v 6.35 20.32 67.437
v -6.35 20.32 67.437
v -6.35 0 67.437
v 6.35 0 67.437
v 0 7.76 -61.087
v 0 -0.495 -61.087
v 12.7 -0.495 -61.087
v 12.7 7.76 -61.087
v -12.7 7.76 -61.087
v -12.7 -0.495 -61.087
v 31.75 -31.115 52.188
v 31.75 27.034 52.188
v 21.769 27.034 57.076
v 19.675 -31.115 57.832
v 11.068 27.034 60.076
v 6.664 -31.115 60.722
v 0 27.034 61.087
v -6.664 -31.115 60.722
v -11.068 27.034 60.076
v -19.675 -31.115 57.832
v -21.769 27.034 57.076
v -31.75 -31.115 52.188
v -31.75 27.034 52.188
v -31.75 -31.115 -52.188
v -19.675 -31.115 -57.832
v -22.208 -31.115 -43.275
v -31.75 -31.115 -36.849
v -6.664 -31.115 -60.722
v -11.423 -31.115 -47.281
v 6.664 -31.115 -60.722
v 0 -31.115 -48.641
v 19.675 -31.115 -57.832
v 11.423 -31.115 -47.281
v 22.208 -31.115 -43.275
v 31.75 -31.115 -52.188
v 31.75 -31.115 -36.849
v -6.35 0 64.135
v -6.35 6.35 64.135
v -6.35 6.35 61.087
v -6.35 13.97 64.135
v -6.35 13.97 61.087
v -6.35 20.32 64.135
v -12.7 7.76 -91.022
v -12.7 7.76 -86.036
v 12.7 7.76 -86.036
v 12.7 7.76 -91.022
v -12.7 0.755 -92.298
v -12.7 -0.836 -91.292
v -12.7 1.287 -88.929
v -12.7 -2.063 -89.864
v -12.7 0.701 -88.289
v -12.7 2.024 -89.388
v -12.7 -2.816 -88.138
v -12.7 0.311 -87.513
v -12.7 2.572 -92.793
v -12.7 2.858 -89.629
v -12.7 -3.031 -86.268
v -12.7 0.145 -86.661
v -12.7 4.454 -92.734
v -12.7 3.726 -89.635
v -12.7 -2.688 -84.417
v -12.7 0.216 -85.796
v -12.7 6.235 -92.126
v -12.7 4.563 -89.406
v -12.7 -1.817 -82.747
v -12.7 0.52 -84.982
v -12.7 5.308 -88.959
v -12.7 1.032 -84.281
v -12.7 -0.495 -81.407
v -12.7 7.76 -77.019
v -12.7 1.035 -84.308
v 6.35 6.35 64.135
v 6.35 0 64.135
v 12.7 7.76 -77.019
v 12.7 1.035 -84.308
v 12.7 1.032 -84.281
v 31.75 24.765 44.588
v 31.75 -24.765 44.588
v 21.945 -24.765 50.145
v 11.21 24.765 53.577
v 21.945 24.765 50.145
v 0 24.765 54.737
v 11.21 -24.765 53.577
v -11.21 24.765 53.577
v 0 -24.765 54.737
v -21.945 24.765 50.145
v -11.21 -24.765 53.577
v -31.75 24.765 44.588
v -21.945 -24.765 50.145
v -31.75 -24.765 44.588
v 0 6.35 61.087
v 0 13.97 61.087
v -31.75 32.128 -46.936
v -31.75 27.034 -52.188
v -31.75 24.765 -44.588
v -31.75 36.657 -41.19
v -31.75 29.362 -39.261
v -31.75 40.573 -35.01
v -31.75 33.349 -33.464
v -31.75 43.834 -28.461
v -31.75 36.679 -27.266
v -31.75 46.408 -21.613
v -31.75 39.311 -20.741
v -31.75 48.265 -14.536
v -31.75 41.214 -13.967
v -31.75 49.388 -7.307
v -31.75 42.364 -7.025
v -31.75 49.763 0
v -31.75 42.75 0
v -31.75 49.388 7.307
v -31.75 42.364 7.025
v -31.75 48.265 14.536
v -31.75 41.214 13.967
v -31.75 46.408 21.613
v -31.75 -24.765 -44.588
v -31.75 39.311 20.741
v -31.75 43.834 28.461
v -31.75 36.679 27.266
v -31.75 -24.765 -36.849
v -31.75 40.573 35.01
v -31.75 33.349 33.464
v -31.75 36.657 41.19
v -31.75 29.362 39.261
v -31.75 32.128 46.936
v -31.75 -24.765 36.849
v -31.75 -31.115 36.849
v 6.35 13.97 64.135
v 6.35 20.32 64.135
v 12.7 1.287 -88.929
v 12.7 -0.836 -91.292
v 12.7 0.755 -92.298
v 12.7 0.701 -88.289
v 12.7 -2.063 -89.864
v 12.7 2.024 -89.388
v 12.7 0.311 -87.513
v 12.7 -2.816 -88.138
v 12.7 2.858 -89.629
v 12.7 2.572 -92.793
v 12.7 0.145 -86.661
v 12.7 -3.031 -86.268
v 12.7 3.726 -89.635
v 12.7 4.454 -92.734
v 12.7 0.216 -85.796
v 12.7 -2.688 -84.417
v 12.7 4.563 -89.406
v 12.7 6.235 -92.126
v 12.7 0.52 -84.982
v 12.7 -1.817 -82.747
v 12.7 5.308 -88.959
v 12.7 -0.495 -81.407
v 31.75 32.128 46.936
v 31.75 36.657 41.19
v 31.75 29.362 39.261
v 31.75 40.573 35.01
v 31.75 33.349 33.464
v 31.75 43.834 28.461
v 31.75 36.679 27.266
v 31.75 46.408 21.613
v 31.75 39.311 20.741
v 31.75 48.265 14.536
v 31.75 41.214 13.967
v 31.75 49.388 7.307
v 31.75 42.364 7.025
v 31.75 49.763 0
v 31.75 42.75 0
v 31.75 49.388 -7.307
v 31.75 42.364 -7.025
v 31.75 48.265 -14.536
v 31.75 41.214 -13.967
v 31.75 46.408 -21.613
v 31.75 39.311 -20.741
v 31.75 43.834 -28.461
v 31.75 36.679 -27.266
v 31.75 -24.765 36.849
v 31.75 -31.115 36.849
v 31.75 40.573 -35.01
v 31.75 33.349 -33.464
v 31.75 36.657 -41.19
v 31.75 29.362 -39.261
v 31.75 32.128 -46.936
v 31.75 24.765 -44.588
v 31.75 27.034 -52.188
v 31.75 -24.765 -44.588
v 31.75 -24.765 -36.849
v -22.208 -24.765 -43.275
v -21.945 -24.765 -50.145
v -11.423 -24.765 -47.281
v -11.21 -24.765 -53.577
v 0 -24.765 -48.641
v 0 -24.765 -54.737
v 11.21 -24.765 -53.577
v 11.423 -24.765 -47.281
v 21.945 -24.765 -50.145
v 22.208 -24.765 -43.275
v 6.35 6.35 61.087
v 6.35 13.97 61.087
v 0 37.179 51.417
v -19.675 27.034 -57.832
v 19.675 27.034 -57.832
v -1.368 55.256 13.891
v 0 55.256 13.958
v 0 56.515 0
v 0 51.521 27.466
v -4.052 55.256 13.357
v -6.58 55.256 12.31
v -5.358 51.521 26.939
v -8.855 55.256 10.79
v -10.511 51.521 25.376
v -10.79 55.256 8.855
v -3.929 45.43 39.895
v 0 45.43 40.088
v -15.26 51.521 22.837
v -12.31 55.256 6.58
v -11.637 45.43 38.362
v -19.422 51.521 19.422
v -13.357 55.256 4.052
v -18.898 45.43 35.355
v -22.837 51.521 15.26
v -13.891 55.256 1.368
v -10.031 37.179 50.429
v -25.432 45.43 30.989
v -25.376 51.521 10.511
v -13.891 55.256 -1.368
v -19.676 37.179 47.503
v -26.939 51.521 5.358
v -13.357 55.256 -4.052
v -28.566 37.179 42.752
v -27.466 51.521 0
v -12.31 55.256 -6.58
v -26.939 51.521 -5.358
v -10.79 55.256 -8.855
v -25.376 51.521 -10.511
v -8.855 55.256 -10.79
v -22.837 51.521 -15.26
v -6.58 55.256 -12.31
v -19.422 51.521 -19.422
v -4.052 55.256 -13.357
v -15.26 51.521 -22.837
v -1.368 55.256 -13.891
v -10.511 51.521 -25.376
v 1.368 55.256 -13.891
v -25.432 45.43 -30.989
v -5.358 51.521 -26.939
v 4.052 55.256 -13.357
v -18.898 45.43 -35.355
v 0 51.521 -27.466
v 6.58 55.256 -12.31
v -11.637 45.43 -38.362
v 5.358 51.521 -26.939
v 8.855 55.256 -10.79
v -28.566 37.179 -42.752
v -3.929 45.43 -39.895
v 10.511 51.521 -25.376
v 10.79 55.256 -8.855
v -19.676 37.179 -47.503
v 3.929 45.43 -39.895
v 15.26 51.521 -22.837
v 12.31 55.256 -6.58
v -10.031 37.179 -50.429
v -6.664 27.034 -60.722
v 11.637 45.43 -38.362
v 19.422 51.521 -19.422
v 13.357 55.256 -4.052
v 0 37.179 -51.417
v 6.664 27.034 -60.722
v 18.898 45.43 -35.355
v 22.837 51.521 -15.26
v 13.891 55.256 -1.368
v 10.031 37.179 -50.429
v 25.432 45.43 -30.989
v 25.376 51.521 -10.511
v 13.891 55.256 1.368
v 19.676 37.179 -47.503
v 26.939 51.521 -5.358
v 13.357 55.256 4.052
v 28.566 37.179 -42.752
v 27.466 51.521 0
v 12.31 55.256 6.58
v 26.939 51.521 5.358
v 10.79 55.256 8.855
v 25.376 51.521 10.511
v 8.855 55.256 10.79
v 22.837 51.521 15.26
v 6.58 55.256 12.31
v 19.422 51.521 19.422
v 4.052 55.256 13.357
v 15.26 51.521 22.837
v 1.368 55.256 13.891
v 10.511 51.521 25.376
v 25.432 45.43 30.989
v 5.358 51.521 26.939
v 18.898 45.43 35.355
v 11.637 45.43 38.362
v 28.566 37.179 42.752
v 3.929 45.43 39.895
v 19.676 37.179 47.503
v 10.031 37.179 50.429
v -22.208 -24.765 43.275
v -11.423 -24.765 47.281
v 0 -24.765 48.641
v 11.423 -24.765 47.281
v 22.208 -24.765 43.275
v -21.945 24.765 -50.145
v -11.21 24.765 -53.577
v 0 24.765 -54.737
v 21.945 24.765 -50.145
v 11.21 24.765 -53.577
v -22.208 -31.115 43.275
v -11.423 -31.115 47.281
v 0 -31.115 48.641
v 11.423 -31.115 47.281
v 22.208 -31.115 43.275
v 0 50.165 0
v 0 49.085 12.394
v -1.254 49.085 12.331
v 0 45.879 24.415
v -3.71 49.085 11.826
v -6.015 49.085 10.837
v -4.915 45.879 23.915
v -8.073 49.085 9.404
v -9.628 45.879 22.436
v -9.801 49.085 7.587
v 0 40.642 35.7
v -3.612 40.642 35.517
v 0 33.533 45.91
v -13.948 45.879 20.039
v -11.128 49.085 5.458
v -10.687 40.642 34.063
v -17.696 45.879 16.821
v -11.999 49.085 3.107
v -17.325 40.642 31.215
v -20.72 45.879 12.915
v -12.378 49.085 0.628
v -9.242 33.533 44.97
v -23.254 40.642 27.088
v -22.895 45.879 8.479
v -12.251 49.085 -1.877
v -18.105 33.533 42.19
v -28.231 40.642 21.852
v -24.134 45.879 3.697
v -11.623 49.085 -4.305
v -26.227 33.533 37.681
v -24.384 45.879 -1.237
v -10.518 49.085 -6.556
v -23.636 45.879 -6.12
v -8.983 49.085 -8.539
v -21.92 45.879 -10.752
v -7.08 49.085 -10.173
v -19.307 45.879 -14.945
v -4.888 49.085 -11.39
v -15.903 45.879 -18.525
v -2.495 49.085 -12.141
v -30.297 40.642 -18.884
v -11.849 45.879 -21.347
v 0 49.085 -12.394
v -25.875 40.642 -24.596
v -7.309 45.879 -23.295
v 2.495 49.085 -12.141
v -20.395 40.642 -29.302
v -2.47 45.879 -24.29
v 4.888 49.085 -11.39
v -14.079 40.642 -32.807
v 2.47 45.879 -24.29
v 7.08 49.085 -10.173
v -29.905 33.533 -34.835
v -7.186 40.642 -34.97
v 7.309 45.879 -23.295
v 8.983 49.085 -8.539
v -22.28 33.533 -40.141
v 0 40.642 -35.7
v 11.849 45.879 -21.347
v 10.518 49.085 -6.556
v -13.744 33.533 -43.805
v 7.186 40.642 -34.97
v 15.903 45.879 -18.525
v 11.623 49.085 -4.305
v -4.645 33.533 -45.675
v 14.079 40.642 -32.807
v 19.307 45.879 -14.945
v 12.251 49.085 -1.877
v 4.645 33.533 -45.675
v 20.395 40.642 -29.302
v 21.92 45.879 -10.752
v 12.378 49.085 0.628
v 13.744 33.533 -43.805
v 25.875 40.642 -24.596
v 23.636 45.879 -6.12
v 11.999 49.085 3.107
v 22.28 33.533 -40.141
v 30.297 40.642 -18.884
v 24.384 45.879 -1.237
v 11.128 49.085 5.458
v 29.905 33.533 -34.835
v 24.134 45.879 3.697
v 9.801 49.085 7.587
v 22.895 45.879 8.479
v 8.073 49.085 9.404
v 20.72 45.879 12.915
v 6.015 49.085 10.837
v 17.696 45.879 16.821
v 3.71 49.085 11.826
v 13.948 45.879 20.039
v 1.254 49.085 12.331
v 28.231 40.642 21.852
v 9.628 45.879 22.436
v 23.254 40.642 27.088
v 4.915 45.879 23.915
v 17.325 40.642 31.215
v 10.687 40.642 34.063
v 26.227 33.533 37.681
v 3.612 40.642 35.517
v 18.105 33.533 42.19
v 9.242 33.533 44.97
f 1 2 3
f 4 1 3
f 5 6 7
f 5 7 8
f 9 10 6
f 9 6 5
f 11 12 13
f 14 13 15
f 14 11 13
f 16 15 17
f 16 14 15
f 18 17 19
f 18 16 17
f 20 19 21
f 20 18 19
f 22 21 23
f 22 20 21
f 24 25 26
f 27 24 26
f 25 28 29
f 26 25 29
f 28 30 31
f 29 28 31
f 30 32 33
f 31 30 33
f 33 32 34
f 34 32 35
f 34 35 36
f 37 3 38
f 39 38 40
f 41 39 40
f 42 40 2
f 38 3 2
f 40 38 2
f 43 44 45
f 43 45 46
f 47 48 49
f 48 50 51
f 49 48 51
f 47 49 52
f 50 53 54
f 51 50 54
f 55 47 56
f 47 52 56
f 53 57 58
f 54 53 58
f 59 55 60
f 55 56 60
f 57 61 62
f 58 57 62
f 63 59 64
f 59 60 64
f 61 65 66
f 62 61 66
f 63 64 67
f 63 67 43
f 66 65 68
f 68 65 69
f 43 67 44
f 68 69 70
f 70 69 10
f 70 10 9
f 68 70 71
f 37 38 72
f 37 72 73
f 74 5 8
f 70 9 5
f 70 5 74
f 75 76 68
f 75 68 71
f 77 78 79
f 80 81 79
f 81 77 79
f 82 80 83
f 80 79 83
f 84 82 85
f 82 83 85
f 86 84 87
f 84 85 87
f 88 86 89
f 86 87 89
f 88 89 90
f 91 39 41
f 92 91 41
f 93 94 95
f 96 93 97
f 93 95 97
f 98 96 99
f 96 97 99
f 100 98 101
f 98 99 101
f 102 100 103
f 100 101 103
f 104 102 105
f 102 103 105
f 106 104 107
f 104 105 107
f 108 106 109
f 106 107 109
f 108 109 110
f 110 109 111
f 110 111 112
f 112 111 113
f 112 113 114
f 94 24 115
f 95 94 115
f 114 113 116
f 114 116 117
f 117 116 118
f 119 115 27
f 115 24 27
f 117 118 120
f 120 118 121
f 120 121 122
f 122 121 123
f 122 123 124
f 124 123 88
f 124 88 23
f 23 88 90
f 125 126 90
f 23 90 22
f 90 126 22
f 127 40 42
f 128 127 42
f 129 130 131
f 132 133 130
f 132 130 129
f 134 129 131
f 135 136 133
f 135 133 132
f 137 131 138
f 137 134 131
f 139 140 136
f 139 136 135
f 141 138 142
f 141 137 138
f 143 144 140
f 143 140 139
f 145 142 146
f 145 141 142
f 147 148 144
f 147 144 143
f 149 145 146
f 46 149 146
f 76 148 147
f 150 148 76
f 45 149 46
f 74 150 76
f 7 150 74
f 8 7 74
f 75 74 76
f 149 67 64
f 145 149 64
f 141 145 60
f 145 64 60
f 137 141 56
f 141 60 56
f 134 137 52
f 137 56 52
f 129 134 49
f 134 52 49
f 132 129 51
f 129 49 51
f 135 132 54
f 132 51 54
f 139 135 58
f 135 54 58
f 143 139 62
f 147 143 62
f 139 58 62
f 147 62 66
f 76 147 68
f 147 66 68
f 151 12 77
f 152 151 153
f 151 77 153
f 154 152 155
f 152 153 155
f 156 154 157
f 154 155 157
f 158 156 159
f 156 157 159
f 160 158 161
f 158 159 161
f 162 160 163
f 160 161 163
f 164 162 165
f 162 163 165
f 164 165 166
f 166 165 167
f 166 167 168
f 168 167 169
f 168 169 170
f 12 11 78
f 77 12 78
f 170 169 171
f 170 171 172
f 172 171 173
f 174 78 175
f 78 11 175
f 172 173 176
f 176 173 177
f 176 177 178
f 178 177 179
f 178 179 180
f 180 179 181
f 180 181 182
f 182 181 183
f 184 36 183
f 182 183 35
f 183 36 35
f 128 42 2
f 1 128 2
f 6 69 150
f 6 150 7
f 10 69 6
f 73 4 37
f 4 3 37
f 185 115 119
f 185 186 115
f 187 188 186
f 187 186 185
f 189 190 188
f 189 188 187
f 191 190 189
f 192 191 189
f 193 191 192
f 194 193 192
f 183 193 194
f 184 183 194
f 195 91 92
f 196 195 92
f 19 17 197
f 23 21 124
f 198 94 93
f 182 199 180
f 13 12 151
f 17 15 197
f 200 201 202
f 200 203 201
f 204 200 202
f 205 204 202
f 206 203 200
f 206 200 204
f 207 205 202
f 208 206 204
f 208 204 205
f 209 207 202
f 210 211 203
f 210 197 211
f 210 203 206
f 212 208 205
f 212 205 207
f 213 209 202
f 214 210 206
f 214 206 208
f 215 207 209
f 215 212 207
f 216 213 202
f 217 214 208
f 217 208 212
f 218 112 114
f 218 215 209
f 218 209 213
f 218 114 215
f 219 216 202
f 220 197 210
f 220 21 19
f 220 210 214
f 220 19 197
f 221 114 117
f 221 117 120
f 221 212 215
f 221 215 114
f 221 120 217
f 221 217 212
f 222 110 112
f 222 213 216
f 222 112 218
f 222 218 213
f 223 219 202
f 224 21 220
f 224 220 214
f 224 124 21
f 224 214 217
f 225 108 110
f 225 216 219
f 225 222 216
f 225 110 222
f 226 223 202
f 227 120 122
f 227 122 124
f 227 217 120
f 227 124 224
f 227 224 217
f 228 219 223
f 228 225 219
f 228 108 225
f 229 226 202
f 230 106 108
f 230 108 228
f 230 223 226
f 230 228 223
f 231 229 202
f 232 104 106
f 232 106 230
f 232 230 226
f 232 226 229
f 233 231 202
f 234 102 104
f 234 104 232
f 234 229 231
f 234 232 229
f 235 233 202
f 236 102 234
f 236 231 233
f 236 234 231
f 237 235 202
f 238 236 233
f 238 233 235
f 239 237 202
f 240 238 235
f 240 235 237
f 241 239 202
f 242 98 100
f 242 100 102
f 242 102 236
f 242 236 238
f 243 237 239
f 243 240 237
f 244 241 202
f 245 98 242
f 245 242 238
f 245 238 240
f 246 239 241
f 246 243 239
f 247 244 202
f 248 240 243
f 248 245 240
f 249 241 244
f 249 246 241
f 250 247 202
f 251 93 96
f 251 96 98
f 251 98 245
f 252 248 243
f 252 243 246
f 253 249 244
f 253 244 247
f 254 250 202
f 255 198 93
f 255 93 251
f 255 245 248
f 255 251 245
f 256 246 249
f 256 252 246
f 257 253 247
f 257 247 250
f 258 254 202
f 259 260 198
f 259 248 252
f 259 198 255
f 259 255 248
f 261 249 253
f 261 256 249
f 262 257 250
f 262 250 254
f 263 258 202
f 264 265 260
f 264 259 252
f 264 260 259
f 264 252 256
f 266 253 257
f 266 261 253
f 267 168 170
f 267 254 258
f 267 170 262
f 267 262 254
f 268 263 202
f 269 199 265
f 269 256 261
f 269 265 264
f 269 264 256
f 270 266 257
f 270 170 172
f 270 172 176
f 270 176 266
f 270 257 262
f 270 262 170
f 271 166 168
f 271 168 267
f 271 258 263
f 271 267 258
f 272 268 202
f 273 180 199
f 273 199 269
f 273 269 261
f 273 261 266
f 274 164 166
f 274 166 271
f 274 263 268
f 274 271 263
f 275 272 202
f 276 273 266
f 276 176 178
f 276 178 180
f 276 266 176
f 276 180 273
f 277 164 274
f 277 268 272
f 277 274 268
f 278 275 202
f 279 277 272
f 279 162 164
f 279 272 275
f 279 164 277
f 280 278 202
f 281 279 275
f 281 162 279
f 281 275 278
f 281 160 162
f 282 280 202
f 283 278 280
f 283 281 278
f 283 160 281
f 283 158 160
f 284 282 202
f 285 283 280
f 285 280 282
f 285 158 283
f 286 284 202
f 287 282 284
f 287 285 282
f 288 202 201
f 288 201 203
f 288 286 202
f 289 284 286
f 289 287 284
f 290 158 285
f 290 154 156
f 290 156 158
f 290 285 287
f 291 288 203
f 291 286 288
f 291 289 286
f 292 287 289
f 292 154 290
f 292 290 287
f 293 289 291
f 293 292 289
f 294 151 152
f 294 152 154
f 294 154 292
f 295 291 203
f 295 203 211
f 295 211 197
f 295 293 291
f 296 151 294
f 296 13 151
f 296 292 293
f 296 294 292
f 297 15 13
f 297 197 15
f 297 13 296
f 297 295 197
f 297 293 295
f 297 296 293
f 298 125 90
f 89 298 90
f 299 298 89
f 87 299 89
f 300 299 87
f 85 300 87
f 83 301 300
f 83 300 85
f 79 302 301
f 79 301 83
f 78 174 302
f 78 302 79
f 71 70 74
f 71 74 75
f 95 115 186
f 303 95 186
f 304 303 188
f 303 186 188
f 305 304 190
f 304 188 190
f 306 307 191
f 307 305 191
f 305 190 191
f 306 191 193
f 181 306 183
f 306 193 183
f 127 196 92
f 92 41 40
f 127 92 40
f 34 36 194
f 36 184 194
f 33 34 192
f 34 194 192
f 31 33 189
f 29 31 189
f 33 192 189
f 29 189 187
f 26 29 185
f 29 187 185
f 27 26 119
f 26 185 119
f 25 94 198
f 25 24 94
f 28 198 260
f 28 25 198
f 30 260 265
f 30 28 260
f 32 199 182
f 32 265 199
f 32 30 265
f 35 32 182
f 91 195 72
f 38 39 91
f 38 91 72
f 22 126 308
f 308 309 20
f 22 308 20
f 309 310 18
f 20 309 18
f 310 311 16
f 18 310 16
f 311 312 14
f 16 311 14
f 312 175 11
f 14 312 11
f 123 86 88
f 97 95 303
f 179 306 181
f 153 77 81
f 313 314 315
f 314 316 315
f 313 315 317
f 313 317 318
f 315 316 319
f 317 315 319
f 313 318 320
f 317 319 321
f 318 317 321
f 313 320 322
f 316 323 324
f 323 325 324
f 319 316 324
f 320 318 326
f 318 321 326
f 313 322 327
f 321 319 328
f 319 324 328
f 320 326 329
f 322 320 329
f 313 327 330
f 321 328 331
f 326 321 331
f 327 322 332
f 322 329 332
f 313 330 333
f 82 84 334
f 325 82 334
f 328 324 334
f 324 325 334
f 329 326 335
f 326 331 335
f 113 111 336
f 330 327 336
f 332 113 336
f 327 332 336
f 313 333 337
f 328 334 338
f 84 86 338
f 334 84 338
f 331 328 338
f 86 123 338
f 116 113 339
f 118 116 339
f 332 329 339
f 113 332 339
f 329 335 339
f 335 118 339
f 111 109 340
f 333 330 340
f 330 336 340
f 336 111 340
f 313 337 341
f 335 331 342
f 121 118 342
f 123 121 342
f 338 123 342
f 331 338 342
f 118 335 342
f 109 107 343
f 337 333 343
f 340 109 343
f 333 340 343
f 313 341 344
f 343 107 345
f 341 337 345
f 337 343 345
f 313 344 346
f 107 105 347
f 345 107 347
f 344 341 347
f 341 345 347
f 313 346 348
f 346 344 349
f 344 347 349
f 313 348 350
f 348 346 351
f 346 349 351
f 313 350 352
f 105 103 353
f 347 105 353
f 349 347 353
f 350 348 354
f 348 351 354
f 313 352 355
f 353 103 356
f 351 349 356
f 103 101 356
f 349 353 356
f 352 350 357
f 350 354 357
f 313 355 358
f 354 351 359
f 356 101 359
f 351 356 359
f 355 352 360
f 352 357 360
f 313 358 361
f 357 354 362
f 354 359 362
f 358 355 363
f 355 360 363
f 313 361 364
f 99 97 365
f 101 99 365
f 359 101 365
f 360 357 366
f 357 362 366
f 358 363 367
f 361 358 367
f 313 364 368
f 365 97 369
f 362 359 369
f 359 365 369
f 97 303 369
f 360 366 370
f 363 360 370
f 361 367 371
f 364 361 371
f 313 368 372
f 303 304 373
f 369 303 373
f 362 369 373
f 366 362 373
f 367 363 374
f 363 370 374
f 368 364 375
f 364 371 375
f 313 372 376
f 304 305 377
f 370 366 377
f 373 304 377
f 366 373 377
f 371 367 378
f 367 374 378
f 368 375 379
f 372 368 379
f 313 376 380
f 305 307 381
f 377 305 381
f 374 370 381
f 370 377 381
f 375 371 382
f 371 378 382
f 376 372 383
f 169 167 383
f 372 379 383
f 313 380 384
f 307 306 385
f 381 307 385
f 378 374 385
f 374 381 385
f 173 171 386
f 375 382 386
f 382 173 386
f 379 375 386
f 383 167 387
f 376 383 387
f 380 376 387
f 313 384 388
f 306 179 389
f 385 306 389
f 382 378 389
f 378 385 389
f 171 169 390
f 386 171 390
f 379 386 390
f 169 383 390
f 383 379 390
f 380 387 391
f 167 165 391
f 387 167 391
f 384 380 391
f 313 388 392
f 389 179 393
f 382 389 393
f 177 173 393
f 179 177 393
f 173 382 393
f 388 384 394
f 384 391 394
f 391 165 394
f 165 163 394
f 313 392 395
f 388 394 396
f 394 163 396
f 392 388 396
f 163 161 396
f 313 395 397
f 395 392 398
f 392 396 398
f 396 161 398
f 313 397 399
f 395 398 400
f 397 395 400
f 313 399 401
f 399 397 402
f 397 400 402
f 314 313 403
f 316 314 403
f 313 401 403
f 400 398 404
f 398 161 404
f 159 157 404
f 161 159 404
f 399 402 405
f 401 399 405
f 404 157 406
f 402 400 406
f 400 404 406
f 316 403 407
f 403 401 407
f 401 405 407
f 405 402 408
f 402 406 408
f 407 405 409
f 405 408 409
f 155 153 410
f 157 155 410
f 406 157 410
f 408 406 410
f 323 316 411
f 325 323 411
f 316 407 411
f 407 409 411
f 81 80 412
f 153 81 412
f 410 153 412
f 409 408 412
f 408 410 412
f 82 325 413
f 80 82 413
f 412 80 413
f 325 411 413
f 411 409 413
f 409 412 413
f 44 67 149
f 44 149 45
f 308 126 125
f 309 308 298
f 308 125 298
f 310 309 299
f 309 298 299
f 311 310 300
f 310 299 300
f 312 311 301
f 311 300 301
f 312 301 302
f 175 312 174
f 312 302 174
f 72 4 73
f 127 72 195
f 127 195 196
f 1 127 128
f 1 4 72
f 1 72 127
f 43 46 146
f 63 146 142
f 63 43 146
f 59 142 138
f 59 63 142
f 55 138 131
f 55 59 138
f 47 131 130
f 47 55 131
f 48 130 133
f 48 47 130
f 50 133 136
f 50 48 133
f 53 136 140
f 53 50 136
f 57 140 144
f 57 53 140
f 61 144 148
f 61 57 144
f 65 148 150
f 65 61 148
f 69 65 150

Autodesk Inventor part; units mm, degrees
ref_plane "YZ Plane" through (0, 0, 0) normal (1, 0, 0) x (0, 1, 0)
ref_plane "XZ Plane" through (0, 0, 0) normal (0, 1, 0) x (-1, 0, 0)
ref_plane "XY Plane" through (0, 0, 0) normal (0, 0, 1) x (1, 0, 0)
sketch "Sketch3" plane through (0, 0, 0) normal (1, 0, 0) x (0, 1, 0)
  line L0 (24.765, 54.737) -> (-24.765, 54.737)
  line L1 (-24.765, 54.737) -> (-24.765, -54.737)
  line L2 (-24.765, -54.737) -> (24.765, -54.737)
  line L3 (24.765, 54.737) -> (-24.765, -54.737) construction
  line L4 (-24.765, 54.737) -> (24.765, -54.737) construction
  arc A0 (24.765, -54.737) -> (24.765, 54.737) centre (-21.5141, 0) ccw
  line L5 (27.034, 61.087) -> (-31.115, 61.087)
  line L6 (-31.115, 61.087) -> (-31.115, -61.087)
  line L7 (-31.115, -61.087) -> (27.034, -61.087)
  arc A1 (27.034, -61.087) -> (27.034, 61.087) centre (-21.5141, 0) ccw
  line L8 (-38.7767, 48.641) -> (-10.7533, 48.641)
  line L9 (-10.7533, 48.641) -> (-10.7533, -48.641)
  line L10 (-10.7533, -48.641) -> (-38.7767, -48.641)
  line L11 (-38.7767, -48.641) -> (-38.7767, 48.641)
  line L12 (-38.7767, 48.641) -> (-10.7533, -48.641) construction
  line L13 (-10.7533, 48.641) -> (-38.7767, -48.641) construction
  line L14 (-24.765, 0) -> (73.8753, 0)
  point P0 (0, 0)
  point P1 (24.765, 0)
  point P2 (50.165, 0)
  point P3 (50.165, 0)
  point P4 (56.515, 0)
  point P5 (-31.115, 48.641)
  point P6 (-24.765, 48.641)
  dimension "d15" = 63.5
  dimension "d7" = 109.474
  dimension "d9" = 74.93
  dimension "d10" = 49.53
  dimension "d11" = 6.35
  dimension "d13" = 6.096
revolve "Revolution1" add sketch "Sketch3" angle 360 about axis through (0, -24.765, 0) along (0, 1, 0) contours L0 L1 L8 L6 L5 A1 L14 A0
sketch "Sketch4" plane through (0, -31.115, 0) normal (0, -1, 0) x (1, 0, 0)
  line L0 (-31.75, 80.7888) -> (31.75, 80.7888)
  line L1 (31.75, 80.7888) -> (31.75, -80.7888)
  line L2 (31.75, -80.7888) -> (-31.75, -80.7888)
  line L3 (-31.75, -80.7888) -> (-31.75, 80.7888)
  line L4 (-31.75, 80.7888) -> (31.75, -80.7888) construction
  line L5 (31.75, 80.7888) -> (-31.75, -80.7888) construction
  line L6 (64.3082, -113.347) -> (64.3082, 113.347)
  line L7 (64.3082, 113.347) -> (-64.3082, 113.347)
  line L8 (-64.3082, 113.347) -> (-64.3082, -113.347)
  line L9 (-64.3082, -113.347) -> (64.3082, -113.347)
  point P0 (0, 0)
  dimension "d15" = 63.5
extrude "Extrusion2" cut sketch "Sketch4" against normal through all
sketch "Sketch5" plane through (0, 0, 0) normal (1, 0, 0) x (0, 1, 0)
  line L0 (-31.115, -61.087) -> (27.034, -61.087) projected
  line L1 (-0.4947, -61.087) -> (7.7603, -61.087)
  line L2 (7.7603, -61.087) -> (7.7603, -91.0218)
  line L3 (-0.4947, -81.407) -> (-0.4947, -61.087)
  line L4 (7.7603, -61.087) -> (0.1403, -61.087)
  line L5 (0.1403, -61.087) -> (0.1403, -58.2773)
  line L6 (0.1403, -58.2773) -> (7.7603, -58.2773)
  line L7 (7.7603, -58.2773) -> (7.7603, -61.087)
  arc A0 (1.0316, -84.2813) -> (5.3075, -88.9592) centre (3.3153, -86.487) ccw
  arc A1 (-0.4947, -81.407) -> (9.2585, -84.2506) centre (3.3153, -86.487) ccw
  line L8 (5.3075, -88.9592) -> (9.2585, -84.2506)
  line L9 (5.3075, -88.9592) -> (25.8571, -88.9592) construction
  line L10 (1.0316, -84.2813) -> (2.2156, -92.7411)
  line L11 (7.7603, -77.0191) -> (0.7466, -84.621)
  line L12 (7.7603, -86.487) -> (7.3819, -86.487)
  line L13 (1.3403, -86.487) -> (0.1403, -86.487)
  point P0 (0, 0)
  point P1 (6.0959, -88.0196)
  point P2 (1.7249, -89.2349)
  point P3 (7.7603, -86.036)
  point P4 (1.0353, -84.308)
  dimension "d18" = 7.62
  dimension "d19" = 25.4
  dimension "d20" = 6.35
  dimension "d21" = 12.7
  dimension "d22" = 50
extrude "Extrusion3" add sketch "Sketch5" along normal mid plane 25.4 contours L0 L2 L11 L10 A0 A1 L3 | L10 A0 L8 L12 L2 A1 | L2 L12 L8
sketch "Sketch6" plane through (0, 0, 0) normal (1, 0, 0) x (0, 1, 0)
  line L0 (-31.115, 61.087) -> (27.034, 61.087) projected
  line L1 (0, 61.087) -> (20.32, 61.087)
  line L2 (20.32, 61.087) -> (20.32, 67.437)
  line L3 (20.32, 67.437) -> (0, 67.437)
  line L4 (0, 67.437) -> (0, 61.087)
  line L5 (20.32, 61.087) -> (13.97, 61.087)
  line L6 (13.97, 61.087) -> (13.97, 64.135)
  line L7 (13.97, 64.135) -> (20.32, 64.135)
  line L8 (20.32, 64.135) -> (20.32, 61.087)
  line L9 (0, 61.087) -> (6.35, 61.087)
  line L10 (6.35, 61.087) -> (6.35, 64.135)
  line L11 (6.35, 64.135) -> (0, 64.135)
  line L12 (0, 64.135) -> (0, 61.087)
  point P0 (0, 0)
  dimension "d25" = 20.32
  dimension "d26" = 6.35
  dimension "d27" = 6.35
  dimension "d28" = 3.048
  dimension "d29" = 6.35
  dimension "d30" = 3.048
extrude "Extrusion4" add sketch "Sketch6" along normal mid plane 12.7 contours L10 L11 L4 L3 L2 L7 L6 L0
properties part number "Solar_Panel_Mount"
